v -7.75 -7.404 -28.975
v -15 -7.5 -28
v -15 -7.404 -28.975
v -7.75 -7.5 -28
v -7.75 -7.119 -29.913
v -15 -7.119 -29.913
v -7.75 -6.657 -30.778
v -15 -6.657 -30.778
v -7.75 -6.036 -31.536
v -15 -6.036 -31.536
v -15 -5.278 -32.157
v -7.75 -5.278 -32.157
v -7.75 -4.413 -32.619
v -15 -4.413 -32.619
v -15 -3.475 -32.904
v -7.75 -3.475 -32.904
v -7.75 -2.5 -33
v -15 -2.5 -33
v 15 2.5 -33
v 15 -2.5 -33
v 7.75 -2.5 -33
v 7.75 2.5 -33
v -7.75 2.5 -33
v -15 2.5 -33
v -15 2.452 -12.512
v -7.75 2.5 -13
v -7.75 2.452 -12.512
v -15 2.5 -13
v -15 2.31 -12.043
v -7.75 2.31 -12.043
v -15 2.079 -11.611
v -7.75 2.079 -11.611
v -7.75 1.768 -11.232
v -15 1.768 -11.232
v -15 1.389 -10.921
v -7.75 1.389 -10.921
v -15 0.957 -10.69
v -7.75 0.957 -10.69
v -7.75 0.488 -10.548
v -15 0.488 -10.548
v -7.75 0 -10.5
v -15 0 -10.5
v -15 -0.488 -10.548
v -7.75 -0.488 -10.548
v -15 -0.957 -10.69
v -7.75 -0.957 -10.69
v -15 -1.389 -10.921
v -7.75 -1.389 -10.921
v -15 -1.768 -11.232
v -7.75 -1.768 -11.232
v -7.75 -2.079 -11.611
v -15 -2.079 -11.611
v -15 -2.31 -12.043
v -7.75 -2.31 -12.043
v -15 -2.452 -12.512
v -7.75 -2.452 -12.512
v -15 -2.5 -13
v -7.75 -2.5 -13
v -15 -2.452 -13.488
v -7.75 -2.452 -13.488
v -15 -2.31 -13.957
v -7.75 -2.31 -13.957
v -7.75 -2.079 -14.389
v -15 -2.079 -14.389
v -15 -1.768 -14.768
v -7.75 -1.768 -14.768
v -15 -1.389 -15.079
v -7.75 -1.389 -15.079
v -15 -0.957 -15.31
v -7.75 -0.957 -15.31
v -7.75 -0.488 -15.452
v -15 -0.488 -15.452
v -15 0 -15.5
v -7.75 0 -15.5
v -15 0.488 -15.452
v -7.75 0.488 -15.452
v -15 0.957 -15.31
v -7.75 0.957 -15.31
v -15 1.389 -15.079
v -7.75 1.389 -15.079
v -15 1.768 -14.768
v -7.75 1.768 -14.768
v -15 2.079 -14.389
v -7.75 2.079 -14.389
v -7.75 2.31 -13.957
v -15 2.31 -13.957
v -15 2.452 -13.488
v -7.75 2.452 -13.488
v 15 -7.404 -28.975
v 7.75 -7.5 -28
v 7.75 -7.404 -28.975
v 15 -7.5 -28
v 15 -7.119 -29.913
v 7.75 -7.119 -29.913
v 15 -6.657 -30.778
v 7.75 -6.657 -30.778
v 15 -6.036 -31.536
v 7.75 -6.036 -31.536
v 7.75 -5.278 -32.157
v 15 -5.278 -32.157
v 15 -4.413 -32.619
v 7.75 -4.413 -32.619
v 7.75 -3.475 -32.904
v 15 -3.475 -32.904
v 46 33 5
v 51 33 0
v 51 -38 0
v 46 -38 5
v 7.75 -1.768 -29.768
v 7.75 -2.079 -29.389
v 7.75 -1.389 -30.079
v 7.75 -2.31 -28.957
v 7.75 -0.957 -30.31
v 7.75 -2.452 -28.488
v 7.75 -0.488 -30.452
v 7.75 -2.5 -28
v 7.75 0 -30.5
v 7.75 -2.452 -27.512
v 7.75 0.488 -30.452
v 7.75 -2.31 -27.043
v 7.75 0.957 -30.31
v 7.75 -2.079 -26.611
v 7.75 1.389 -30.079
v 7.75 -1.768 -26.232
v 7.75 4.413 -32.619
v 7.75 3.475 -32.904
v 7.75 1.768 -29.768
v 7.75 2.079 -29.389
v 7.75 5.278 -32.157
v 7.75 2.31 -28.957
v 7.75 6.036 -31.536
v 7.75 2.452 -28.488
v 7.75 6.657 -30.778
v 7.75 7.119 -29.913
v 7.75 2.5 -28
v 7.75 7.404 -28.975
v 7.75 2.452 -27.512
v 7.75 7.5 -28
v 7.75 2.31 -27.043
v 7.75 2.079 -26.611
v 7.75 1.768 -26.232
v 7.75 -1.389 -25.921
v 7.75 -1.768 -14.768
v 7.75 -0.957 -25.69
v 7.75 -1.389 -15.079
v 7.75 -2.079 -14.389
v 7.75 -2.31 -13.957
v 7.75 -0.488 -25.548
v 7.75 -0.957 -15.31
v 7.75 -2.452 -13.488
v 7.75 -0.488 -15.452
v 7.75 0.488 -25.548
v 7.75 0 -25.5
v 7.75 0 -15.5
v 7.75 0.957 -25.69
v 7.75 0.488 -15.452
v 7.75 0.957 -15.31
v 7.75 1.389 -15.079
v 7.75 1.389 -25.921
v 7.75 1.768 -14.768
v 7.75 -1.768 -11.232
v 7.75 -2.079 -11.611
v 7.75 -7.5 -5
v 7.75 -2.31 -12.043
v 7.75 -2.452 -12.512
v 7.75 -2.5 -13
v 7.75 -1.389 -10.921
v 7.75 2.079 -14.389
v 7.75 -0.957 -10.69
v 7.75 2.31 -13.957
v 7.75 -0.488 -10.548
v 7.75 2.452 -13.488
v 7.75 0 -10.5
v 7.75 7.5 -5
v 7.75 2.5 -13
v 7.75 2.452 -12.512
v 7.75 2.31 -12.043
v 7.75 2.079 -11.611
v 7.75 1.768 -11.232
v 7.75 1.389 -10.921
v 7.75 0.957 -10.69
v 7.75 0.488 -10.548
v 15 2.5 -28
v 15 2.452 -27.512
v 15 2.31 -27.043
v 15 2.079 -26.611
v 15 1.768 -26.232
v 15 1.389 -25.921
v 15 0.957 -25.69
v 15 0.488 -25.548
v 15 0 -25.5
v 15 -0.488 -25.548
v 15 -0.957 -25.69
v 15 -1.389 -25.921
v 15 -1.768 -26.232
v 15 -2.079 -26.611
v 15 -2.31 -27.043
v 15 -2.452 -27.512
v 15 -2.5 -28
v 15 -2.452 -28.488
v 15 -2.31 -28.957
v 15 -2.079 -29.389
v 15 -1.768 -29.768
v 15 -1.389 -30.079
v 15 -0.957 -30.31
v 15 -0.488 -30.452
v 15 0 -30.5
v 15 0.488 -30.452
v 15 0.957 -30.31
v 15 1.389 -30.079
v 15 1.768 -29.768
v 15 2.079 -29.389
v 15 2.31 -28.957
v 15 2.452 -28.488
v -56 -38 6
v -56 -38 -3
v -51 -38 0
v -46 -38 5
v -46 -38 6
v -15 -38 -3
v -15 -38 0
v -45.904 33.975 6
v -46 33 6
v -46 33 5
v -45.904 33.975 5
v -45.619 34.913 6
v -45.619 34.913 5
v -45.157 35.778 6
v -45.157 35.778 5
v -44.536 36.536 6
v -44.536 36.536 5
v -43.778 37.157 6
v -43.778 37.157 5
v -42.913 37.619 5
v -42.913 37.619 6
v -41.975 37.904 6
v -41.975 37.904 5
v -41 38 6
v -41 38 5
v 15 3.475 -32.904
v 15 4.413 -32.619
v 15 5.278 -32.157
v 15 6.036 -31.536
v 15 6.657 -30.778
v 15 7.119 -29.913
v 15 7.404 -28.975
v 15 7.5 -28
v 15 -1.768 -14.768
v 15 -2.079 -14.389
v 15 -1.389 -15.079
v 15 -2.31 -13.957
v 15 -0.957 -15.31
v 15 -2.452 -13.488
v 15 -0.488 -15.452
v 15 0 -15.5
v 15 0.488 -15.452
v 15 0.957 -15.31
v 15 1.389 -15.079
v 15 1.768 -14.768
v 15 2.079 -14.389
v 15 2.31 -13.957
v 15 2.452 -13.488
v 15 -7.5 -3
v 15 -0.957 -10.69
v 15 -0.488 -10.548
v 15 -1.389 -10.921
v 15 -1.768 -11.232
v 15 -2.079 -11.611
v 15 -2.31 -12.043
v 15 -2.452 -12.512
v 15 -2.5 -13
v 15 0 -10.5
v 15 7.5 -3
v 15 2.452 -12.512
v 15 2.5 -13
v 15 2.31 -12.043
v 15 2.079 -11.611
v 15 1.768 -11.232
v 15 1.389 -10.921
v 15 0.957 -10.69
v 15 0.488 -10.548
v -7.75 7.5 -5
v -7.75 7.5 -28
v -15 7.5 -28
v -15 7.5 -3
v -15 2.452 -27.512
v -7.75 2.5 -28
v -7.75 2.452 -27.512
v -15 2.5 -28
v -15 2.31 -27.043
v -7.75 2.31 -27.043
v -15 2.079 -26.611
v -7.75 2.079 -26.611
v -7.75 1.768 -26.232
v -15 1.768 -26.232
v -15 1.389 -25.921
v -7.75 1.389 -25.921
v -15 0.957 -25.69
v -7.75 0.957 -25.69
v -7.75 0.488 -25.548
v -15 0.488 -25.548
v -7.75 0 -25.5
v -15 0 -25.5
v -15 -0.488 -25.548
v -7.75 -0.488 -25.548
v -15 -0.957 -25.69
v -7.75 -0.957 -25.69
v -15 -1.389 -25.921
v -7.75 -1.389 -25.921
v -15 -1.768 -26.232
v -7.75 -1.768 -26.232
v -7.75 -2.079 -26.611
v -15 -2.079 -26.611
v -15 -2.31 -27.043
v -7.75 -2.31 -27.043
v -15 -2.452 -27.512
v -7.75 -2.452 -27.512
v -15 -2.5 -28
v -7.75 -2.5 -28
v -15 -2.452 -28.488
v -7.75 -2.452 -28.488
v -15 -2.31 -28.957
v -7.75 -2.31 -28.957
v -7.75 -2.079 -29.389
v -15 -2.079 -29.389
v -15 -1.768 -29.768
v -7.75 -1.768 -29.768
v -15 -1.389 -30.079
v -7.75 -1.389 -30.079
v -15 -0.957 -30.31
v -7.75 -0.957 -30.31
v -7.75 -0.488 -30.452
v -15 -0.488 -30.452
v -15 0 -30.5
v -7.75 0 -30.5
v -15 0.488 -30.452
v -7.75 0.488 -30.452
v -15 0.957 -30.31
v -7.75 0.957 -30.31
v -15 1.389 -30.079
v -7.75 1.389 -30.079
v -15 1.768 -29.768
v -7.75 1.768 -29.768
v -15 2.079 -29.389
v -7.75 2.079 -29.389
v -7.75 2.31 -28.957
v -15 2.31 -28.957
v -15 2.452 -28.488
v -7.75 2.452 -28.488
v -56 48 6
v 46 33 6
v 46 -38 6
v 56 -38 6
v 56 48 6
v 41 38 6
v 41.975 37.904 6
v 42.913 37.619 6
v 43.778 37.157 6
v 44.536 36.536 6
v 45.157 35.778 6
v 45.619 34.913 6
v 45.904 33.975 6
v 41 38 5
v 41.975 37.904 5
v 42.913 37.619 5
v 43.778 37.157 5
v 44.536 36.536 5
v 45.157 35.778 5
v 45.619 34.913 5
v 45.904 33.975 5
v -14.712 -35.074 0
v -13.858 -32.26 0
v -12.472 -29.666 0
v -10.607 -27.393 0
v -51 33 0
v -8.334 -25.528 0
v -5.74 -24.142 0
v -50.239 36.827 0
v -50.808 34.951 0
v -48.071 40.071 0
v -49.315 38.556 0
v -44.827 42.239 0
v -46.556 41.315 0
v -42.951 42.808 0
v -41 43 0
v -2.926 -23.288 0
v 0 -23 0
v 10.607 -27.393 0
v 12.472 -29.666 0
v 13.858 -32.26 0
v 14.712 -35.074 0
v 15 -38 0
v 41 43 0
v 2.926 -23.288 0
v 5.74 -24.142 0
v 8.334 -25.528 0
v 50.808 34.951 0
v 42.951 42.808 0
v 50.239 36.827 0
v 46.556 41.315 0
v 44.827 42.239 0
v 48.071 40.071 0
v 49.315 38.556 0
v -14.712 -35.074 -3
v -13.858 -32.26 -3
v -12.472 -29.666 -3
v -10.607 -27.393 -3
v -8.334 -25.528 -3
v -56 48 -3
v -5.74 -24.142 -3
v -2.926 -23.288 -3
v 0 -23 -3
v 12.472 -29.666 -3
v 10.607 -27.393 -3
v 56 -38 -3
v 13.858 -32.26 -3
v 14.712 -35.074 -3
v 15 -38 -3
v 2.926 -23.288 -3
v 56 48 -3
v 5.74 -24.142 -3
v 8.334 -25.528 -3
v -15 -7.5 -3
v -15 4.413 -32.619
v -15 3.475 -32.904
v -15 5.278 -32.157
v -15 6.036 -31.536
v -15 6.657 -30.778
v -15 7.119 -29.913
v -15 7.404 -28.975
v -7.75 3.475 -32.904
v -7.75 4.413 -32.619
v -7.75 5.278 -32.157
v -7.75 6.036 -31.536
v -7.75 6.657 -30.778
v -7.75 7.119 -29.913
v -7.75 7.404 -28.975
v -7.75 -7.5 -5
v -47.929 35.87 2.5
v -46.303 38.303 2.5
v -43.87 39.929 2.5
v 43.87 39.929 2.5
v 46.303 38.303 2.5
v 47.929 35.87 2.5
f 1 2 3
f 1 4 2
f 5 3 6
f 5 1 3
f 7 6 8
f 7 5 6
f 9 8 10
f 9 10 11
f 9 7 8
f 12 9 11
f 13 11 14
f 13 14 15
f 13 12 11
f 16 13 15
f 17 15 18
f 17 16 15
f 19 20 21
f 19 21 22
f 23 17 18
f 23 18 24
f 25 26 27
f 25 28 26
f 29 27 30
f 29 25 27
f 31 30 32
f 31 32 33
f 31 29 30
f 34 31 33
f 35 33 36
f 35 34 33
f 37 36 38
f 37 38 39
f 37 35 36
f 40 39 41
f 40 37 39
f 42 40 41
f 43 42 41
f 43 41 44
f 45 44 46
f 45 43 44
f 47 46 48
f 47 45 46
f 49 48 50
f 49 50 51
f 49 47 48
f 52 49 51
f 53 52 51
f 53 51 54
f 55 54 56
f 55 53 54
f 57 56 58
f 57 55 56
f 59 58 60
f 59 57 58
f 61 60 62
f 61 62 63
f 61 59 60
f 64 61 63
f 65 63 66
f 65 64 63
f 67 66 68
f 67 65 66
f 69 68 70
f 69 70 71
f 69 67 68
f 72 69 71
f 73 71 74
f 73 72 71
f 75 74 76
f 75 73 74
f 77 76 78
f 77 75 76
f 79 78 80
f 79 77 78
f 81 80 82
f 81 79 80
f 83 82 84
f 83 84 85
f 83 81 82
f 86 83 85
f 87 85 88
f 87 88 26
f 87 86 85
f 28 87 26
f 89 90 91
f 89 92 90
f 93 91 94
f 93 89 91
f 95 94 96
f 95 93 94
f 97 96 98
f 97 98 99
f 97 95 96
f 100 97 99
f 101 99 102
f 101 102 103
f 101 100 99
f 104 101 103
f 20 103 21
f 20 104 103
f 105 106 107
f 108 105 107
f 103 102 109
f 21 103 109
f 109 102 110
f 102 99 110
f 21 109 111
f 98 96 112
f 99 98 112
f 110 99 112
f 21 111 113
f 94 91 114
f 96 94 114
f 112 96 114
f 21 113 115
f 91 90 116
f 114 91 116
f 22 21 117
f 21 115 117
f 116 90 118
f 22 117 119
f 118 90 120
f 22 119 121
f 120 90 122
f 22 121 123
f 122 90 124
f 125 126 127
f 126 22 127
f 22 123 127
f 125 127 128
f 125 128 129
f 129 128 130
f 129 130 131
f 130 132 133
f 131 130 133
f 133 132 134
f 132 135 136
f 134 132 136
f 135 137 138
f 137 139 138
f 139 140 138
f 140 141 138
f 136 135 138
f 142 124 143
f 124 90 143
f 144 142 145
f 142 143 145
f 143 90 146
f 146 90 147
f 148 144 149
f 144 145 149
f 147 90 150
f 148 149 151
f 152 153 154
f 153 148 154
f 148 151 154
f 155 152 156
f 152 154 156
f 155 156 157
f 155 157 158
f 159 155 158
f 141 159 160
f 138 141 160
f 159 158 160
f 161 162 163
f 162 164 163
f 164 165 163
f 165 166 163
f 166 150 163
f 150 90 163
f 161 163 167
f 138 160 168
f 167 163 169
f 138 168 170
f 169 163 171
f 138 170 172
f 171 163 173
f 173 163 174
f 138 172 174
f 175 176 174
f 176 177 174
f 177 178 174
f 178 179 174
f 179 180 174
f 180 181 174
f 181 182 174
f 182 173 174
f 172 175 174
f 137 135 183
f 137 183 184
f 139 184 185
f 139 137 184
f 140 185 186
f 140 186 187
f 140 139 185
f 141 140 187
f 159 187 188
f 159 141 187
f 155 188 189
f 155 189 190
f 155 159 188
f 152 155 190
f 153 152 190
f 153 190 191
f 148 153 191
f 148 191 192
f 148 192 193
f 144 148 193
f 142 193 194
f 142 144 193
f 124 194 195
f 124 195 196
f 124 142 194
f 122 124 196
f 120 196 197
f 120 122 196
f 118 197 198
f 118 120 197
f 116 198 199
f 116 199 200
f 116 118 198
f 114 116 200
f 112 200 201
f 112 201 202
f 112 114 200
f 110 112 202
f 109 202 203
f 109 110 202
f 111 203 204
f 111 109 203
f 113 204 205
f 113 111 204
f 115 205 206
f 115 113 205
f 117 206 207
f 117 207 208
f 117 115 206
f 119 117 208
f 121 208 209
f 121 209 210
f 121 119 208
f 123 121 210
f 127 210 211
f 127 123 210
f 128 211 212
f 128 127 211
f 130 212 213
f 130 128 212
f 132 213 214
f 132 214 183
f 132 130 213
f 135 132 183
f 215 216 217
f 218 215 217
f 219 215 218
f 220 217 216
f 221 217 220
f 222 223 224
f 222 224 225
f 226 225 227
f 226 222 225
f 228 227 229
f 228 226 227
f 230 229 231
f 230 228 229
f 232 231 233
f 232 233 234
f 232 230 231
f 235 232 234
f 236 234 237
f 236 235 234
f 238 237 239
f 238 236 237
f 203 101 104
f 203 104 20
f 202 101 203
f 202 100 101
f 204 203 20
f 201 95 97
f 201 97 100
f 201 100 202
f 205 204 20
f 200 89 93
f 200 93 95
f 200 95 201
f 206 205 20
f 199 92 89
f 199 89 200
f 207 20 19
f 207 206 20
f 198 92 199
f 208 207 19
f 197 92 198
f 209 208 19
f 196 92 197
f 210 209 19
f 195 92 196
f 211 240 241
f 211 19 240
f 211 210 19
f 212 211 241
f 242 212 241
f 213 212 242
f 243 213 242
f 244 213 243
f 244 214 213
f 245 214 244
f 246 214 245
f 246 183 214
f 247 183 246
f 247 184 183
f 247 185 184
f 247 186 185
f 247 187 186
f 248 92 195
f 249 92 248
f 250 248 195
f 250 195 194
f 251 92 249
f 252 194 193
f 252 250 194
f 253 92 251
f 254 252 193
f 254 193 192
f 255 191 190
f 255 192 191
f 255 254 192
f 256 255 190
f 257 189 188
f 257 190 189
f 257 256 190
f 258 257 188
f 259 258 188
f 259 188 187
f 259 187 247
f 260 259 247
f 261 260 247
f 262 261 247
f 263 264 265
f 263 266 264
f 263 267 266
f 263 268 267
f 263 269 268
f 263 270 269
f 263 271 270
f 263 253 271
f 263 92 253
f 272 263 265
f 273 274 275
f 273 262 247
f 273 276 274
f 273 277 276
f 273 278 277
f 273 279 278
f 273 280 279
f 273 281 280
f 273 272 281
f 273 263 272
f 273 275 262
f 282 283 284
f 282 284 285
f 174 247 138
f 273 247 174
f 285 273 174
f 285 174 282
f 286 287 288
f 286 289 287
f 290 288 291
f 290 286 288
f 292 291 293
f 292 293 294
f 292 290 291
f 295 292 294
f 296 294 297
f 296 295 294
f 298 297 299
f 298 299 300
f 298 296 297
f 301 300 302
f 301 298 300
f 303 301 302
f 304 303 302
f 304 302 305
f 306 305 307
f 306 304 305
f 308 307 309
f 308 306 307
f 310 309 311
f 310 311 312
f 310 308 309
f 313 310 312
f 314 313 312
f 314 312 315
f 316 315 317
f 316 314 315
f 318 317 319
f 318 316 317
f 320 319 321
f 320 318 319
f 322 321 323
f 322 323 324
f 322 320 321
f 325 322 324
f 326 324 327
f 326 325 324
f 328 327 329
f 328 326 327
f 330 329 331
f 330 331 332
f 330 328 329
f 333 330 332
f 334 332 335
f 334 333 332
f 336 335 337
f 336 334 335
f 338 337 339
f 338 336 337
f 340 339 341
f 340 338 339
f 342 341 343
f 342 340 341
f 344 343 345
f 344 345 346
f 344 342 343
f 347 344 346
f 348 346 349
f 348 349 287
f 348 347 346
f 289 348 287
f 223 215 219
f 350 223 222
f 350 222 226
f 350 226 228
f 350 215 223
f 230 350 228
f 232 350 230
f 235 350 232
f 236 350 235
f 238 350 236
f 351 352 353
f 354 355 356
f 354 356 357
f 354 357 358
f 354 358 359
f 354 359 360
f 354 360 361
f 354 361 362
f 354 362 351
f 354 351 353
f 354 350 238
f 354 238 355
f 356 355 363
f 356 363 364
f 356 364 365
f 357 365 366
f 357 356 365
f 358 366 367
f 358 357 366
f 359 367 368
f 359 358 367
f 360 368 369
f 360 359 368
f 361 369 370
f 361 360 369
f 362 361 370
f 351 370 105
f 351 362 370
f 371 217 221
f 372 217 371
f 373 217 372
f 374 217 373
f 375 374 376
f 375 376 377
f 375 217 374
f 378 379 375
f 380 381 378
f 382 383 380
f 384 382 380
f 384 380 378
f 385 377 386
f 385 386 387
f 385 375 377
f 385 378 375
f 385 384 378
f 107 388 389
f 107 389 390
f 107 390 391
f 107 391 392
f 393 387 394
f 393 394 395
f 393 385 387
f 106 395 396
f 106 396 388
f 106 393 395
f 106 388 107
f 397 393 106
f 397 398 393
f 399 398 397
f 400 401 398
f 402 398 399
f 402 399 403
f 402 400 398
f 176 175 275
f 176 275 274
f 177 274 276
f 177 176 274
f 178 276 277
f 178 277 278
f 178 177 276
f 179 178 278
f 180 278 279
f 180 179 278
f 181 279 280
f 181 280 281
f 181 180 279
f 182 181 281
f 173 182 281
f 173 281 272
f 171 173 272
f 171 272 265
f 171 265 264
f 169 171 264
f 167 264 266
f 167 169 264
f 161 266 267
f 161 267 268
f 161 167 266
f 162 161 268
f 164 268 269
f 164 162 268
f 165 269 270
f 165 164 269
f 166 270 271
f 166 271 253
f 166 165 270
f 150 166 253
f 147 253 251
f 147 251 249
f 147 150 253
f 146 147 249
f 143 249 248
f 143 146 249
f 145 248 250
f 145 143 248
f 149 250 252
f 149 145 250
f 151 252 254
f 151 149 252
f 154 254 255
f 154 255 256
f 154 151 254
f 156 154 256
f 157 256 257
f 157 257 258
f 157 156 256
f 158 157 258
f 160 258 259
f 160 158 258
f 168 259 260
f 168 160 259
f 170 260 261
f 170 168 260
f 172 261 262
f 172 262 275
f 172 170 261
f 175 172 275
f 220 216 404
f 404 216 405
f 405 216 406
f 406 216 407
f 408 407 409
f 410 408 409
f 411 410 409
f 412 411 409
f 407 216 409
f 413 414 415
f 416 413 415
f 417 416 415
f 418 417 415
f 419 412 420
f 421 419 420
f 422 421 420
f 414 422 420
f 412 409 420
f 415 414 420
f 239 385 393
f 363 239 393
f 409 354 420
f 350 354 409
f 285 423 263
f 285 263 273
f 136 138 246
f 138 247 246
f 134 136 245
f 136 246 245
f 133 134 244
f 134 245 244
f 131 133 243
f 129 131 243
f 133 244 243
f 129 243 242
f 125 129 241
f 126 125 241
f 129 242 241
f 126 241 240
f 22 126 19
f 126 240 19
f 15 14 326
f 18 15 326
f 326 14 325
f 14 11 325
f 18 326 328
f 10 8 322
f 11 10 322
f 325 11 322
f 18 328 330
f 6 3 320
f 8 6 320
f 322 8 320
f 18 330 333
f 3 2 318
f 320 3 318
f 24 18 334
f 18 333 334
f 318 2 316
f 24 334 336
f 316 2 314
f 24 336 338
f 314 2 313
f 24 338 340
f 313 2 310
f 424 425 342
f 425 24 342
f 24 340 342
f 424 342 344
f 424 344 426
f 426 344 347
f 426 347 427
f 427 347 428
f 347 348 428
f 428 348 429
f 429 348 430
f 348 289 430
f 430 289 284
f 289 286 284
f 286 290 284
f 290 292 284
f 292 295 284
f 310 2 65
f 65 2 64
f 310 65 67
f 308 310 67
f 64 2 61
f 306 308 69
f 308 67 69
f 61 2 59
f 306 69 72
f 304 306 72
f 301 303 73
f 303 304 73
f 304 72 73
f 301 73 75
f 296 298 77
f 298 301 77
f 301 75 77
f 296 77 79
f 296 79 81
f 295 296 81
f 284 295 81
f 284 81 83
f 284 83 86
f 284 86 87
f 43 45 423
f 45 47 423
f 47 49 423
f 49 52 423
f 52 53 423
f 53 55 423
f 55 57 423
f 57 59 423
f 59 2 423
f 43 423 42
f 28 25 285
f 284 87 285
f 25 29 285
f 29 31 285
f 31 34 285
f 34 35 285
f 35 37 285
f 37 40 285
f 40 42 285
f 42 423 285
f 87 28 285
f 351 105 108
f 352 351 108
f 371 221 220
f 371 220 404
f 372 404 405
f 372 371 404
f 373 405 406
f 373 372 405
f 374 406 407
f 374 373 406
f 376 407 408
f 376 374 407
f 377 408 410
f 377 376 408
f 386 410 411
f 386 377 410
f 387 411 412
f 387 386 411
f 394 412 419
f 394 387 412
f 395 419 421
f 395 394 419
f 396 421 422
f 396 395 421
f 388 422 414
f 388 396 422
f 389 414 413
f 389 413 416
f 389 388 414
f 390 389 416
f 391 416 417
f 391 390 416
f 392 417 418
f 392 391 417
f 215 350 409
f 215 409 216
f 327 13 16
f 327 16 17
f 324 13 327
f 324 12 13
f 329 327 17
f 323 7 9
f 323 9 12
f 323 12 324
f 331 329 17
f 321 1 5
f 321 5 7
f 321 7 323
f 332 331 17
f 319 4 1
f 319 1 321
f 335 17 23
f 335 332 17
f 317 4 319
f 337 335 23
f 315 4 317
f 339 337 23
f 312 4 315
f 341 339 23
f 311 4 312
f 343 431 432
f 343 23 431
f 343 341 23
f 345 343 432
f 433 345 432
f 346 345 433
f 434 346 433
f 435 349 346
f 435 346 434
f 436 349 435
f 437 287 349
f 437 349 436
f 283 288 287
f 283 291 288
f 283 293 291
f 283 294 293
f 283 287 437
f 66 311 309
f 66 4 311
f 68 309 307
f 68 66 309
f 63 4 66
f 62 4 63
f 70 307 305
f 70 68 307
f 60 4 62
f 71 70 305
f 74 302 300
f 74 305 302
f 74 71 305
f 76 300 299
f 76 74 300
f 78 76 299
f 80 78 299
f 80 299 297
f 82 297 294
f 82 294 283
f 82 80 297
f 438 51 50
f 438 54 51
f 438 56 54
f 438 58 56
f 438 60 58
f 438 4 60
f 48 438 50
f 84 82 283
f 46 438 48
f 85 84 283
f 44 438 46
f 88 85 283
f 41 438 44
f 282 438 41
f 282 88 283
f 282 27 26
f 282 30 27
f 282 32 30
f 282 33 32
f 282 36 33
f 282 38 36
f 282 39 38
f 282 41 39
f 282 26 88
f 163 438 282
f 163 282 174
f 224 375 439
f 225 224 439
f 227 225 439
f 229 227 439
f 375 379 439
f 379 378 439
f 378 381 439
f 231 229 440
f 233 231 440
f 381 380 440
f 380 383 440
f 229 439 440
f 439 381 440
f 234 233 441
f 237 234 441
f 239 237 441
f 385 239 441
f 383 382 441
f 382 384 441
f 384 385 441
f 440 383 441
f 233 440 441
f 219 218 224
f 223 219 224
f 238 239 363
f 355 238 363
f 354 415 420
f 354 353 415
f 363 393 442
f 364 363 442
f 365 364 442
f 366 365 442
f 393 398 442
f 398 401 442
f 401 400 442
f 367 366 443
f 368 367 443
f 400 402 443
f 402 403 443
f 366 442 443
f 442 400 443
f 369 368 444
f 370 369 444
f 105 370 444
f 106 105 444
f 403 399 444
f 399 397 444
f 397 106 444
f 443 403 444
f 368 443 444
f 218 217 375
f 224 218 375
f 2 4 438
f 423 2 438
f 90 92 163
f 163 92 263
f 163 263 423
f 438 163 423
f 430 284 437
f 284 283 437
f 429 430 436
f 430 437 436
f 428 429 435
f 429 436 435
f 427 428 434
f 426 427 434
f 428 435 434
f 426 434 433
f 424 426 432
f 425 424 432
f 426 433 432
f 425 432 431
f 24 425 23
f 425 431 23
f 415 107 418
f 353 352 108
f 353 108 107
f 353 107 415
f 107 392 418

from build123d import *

# Parameters (mm, degrees)
F1_DEPTH  = 6
F2_R      = 5
F3_SIZE   = 5
F5_DEPTH  = 3
F6_W      = 15
F6_H      = 30
F6_R      = 2.5
F7_DEPTH  = 15
F8_DEPTH  = 7.75
F9_W      = 30
F9_H      = 15
F10_DEPTH = 2
F11_R     = 5


with BuildPart() as f1:
    # F0 (on Top) → F1 (new body)
    with BuildSketch(Plane.XY):
        Polygon((-46, -38), (-46, 38), (46, 38), (46, -38), (56.0000004172, -38), (56.0000004172, 48.0000004172), (-56.0000004172, 48.0000004172), (-56.0000004172, -38), align=None)
    extrude(amount=F1_DEPTH)

    # F2
    f2_edges = [f1.edges().sort_by_distance(p)[0] for p in [
        (-46, 38, 3),
        (46, 38, 3),
    ]]
    fillet(f2_edges, radius=F2_R)

    # F3
    f3_edges = [f1.edges().sort_by_distance(p)[0] for p in [
        (-46, -2.5, 0),
    ]]
    chamfer(f3_edges, length=F3_SIZE)

    # F4 (on Top) → F5 (join)
    with BuildSketch(Plane.XY):
        with BuildLine():
            Line((56.0000004172, 48.0000004172), (-56.0000004172, 48.0000004172))
            Line((-56.0000004172, 48.0000004172), (-56.0000004172, -38))
            Line((-56.0000004172, -38), (-15, -38))
            ThreePointArc((-15, -38), (0, -23), (15, -38))
            Line((15, -38), (56.0000004172, -38))
            Line((56.0000004172, -38), (56.0000004172, 48.0000004172))
        make_face()
    extrude(amount=-F5_DEPTH)


with BuildPart() as f7:
    # F6 (on Right) → F7 (new body, symmetric)
    with BuildSketch(Plane.YZ):
        with Locations((0, -18)):
            Rectangle(F6_W, F6_H)
        with Locations((0, -28)):
            Circle(F6_R, mode=Mode.SUBTRACT)
        with Locations((0, -13)):
            Circle(F6_R, mode=Mode.SUBTRACT)
    extrude(amount=F7_DEPTH, both=True)

    # F6 (on Right) → F8 (cut, symmetric)
    with BuildSketch(Plane.YZ):
        with Locations((0, -18)):
            Rectangle(F6_W, F6_H)
        with Locations((0, -28)):
            Circle(F6_R, mode=Mode.SUBTRACT)
        with Locations((0, -13)):
            Circle(F6_R, mode=Mode.SUBTRACT)
    extrude(amount=F8_DEPTH, both=True, mode=Mode.SUBTRACT)

    # F9 (on face) → F10 (join)
    with BuildSketch(Plane(origin=(0, 0, -3), x_dir=(1, 0, 0), z_dir=(0, 0, -1))):
        Rectangle(F9_W, F9_H)
    extrude(amount=F10_DEPTH)

    # F11
    f11_edges = [f7.edges().sort_by_distance(p)[0] for p in [
        (11.375, -7.5, -33),
        (11.375, 7.5, -33),
        (-11.375, -7.5, -33),
        (-11.375, 7.5, -33),
    ]]
    fillet(f11_edges, radius=F11_R)


solid = Compound([f1.part, f7.part])
